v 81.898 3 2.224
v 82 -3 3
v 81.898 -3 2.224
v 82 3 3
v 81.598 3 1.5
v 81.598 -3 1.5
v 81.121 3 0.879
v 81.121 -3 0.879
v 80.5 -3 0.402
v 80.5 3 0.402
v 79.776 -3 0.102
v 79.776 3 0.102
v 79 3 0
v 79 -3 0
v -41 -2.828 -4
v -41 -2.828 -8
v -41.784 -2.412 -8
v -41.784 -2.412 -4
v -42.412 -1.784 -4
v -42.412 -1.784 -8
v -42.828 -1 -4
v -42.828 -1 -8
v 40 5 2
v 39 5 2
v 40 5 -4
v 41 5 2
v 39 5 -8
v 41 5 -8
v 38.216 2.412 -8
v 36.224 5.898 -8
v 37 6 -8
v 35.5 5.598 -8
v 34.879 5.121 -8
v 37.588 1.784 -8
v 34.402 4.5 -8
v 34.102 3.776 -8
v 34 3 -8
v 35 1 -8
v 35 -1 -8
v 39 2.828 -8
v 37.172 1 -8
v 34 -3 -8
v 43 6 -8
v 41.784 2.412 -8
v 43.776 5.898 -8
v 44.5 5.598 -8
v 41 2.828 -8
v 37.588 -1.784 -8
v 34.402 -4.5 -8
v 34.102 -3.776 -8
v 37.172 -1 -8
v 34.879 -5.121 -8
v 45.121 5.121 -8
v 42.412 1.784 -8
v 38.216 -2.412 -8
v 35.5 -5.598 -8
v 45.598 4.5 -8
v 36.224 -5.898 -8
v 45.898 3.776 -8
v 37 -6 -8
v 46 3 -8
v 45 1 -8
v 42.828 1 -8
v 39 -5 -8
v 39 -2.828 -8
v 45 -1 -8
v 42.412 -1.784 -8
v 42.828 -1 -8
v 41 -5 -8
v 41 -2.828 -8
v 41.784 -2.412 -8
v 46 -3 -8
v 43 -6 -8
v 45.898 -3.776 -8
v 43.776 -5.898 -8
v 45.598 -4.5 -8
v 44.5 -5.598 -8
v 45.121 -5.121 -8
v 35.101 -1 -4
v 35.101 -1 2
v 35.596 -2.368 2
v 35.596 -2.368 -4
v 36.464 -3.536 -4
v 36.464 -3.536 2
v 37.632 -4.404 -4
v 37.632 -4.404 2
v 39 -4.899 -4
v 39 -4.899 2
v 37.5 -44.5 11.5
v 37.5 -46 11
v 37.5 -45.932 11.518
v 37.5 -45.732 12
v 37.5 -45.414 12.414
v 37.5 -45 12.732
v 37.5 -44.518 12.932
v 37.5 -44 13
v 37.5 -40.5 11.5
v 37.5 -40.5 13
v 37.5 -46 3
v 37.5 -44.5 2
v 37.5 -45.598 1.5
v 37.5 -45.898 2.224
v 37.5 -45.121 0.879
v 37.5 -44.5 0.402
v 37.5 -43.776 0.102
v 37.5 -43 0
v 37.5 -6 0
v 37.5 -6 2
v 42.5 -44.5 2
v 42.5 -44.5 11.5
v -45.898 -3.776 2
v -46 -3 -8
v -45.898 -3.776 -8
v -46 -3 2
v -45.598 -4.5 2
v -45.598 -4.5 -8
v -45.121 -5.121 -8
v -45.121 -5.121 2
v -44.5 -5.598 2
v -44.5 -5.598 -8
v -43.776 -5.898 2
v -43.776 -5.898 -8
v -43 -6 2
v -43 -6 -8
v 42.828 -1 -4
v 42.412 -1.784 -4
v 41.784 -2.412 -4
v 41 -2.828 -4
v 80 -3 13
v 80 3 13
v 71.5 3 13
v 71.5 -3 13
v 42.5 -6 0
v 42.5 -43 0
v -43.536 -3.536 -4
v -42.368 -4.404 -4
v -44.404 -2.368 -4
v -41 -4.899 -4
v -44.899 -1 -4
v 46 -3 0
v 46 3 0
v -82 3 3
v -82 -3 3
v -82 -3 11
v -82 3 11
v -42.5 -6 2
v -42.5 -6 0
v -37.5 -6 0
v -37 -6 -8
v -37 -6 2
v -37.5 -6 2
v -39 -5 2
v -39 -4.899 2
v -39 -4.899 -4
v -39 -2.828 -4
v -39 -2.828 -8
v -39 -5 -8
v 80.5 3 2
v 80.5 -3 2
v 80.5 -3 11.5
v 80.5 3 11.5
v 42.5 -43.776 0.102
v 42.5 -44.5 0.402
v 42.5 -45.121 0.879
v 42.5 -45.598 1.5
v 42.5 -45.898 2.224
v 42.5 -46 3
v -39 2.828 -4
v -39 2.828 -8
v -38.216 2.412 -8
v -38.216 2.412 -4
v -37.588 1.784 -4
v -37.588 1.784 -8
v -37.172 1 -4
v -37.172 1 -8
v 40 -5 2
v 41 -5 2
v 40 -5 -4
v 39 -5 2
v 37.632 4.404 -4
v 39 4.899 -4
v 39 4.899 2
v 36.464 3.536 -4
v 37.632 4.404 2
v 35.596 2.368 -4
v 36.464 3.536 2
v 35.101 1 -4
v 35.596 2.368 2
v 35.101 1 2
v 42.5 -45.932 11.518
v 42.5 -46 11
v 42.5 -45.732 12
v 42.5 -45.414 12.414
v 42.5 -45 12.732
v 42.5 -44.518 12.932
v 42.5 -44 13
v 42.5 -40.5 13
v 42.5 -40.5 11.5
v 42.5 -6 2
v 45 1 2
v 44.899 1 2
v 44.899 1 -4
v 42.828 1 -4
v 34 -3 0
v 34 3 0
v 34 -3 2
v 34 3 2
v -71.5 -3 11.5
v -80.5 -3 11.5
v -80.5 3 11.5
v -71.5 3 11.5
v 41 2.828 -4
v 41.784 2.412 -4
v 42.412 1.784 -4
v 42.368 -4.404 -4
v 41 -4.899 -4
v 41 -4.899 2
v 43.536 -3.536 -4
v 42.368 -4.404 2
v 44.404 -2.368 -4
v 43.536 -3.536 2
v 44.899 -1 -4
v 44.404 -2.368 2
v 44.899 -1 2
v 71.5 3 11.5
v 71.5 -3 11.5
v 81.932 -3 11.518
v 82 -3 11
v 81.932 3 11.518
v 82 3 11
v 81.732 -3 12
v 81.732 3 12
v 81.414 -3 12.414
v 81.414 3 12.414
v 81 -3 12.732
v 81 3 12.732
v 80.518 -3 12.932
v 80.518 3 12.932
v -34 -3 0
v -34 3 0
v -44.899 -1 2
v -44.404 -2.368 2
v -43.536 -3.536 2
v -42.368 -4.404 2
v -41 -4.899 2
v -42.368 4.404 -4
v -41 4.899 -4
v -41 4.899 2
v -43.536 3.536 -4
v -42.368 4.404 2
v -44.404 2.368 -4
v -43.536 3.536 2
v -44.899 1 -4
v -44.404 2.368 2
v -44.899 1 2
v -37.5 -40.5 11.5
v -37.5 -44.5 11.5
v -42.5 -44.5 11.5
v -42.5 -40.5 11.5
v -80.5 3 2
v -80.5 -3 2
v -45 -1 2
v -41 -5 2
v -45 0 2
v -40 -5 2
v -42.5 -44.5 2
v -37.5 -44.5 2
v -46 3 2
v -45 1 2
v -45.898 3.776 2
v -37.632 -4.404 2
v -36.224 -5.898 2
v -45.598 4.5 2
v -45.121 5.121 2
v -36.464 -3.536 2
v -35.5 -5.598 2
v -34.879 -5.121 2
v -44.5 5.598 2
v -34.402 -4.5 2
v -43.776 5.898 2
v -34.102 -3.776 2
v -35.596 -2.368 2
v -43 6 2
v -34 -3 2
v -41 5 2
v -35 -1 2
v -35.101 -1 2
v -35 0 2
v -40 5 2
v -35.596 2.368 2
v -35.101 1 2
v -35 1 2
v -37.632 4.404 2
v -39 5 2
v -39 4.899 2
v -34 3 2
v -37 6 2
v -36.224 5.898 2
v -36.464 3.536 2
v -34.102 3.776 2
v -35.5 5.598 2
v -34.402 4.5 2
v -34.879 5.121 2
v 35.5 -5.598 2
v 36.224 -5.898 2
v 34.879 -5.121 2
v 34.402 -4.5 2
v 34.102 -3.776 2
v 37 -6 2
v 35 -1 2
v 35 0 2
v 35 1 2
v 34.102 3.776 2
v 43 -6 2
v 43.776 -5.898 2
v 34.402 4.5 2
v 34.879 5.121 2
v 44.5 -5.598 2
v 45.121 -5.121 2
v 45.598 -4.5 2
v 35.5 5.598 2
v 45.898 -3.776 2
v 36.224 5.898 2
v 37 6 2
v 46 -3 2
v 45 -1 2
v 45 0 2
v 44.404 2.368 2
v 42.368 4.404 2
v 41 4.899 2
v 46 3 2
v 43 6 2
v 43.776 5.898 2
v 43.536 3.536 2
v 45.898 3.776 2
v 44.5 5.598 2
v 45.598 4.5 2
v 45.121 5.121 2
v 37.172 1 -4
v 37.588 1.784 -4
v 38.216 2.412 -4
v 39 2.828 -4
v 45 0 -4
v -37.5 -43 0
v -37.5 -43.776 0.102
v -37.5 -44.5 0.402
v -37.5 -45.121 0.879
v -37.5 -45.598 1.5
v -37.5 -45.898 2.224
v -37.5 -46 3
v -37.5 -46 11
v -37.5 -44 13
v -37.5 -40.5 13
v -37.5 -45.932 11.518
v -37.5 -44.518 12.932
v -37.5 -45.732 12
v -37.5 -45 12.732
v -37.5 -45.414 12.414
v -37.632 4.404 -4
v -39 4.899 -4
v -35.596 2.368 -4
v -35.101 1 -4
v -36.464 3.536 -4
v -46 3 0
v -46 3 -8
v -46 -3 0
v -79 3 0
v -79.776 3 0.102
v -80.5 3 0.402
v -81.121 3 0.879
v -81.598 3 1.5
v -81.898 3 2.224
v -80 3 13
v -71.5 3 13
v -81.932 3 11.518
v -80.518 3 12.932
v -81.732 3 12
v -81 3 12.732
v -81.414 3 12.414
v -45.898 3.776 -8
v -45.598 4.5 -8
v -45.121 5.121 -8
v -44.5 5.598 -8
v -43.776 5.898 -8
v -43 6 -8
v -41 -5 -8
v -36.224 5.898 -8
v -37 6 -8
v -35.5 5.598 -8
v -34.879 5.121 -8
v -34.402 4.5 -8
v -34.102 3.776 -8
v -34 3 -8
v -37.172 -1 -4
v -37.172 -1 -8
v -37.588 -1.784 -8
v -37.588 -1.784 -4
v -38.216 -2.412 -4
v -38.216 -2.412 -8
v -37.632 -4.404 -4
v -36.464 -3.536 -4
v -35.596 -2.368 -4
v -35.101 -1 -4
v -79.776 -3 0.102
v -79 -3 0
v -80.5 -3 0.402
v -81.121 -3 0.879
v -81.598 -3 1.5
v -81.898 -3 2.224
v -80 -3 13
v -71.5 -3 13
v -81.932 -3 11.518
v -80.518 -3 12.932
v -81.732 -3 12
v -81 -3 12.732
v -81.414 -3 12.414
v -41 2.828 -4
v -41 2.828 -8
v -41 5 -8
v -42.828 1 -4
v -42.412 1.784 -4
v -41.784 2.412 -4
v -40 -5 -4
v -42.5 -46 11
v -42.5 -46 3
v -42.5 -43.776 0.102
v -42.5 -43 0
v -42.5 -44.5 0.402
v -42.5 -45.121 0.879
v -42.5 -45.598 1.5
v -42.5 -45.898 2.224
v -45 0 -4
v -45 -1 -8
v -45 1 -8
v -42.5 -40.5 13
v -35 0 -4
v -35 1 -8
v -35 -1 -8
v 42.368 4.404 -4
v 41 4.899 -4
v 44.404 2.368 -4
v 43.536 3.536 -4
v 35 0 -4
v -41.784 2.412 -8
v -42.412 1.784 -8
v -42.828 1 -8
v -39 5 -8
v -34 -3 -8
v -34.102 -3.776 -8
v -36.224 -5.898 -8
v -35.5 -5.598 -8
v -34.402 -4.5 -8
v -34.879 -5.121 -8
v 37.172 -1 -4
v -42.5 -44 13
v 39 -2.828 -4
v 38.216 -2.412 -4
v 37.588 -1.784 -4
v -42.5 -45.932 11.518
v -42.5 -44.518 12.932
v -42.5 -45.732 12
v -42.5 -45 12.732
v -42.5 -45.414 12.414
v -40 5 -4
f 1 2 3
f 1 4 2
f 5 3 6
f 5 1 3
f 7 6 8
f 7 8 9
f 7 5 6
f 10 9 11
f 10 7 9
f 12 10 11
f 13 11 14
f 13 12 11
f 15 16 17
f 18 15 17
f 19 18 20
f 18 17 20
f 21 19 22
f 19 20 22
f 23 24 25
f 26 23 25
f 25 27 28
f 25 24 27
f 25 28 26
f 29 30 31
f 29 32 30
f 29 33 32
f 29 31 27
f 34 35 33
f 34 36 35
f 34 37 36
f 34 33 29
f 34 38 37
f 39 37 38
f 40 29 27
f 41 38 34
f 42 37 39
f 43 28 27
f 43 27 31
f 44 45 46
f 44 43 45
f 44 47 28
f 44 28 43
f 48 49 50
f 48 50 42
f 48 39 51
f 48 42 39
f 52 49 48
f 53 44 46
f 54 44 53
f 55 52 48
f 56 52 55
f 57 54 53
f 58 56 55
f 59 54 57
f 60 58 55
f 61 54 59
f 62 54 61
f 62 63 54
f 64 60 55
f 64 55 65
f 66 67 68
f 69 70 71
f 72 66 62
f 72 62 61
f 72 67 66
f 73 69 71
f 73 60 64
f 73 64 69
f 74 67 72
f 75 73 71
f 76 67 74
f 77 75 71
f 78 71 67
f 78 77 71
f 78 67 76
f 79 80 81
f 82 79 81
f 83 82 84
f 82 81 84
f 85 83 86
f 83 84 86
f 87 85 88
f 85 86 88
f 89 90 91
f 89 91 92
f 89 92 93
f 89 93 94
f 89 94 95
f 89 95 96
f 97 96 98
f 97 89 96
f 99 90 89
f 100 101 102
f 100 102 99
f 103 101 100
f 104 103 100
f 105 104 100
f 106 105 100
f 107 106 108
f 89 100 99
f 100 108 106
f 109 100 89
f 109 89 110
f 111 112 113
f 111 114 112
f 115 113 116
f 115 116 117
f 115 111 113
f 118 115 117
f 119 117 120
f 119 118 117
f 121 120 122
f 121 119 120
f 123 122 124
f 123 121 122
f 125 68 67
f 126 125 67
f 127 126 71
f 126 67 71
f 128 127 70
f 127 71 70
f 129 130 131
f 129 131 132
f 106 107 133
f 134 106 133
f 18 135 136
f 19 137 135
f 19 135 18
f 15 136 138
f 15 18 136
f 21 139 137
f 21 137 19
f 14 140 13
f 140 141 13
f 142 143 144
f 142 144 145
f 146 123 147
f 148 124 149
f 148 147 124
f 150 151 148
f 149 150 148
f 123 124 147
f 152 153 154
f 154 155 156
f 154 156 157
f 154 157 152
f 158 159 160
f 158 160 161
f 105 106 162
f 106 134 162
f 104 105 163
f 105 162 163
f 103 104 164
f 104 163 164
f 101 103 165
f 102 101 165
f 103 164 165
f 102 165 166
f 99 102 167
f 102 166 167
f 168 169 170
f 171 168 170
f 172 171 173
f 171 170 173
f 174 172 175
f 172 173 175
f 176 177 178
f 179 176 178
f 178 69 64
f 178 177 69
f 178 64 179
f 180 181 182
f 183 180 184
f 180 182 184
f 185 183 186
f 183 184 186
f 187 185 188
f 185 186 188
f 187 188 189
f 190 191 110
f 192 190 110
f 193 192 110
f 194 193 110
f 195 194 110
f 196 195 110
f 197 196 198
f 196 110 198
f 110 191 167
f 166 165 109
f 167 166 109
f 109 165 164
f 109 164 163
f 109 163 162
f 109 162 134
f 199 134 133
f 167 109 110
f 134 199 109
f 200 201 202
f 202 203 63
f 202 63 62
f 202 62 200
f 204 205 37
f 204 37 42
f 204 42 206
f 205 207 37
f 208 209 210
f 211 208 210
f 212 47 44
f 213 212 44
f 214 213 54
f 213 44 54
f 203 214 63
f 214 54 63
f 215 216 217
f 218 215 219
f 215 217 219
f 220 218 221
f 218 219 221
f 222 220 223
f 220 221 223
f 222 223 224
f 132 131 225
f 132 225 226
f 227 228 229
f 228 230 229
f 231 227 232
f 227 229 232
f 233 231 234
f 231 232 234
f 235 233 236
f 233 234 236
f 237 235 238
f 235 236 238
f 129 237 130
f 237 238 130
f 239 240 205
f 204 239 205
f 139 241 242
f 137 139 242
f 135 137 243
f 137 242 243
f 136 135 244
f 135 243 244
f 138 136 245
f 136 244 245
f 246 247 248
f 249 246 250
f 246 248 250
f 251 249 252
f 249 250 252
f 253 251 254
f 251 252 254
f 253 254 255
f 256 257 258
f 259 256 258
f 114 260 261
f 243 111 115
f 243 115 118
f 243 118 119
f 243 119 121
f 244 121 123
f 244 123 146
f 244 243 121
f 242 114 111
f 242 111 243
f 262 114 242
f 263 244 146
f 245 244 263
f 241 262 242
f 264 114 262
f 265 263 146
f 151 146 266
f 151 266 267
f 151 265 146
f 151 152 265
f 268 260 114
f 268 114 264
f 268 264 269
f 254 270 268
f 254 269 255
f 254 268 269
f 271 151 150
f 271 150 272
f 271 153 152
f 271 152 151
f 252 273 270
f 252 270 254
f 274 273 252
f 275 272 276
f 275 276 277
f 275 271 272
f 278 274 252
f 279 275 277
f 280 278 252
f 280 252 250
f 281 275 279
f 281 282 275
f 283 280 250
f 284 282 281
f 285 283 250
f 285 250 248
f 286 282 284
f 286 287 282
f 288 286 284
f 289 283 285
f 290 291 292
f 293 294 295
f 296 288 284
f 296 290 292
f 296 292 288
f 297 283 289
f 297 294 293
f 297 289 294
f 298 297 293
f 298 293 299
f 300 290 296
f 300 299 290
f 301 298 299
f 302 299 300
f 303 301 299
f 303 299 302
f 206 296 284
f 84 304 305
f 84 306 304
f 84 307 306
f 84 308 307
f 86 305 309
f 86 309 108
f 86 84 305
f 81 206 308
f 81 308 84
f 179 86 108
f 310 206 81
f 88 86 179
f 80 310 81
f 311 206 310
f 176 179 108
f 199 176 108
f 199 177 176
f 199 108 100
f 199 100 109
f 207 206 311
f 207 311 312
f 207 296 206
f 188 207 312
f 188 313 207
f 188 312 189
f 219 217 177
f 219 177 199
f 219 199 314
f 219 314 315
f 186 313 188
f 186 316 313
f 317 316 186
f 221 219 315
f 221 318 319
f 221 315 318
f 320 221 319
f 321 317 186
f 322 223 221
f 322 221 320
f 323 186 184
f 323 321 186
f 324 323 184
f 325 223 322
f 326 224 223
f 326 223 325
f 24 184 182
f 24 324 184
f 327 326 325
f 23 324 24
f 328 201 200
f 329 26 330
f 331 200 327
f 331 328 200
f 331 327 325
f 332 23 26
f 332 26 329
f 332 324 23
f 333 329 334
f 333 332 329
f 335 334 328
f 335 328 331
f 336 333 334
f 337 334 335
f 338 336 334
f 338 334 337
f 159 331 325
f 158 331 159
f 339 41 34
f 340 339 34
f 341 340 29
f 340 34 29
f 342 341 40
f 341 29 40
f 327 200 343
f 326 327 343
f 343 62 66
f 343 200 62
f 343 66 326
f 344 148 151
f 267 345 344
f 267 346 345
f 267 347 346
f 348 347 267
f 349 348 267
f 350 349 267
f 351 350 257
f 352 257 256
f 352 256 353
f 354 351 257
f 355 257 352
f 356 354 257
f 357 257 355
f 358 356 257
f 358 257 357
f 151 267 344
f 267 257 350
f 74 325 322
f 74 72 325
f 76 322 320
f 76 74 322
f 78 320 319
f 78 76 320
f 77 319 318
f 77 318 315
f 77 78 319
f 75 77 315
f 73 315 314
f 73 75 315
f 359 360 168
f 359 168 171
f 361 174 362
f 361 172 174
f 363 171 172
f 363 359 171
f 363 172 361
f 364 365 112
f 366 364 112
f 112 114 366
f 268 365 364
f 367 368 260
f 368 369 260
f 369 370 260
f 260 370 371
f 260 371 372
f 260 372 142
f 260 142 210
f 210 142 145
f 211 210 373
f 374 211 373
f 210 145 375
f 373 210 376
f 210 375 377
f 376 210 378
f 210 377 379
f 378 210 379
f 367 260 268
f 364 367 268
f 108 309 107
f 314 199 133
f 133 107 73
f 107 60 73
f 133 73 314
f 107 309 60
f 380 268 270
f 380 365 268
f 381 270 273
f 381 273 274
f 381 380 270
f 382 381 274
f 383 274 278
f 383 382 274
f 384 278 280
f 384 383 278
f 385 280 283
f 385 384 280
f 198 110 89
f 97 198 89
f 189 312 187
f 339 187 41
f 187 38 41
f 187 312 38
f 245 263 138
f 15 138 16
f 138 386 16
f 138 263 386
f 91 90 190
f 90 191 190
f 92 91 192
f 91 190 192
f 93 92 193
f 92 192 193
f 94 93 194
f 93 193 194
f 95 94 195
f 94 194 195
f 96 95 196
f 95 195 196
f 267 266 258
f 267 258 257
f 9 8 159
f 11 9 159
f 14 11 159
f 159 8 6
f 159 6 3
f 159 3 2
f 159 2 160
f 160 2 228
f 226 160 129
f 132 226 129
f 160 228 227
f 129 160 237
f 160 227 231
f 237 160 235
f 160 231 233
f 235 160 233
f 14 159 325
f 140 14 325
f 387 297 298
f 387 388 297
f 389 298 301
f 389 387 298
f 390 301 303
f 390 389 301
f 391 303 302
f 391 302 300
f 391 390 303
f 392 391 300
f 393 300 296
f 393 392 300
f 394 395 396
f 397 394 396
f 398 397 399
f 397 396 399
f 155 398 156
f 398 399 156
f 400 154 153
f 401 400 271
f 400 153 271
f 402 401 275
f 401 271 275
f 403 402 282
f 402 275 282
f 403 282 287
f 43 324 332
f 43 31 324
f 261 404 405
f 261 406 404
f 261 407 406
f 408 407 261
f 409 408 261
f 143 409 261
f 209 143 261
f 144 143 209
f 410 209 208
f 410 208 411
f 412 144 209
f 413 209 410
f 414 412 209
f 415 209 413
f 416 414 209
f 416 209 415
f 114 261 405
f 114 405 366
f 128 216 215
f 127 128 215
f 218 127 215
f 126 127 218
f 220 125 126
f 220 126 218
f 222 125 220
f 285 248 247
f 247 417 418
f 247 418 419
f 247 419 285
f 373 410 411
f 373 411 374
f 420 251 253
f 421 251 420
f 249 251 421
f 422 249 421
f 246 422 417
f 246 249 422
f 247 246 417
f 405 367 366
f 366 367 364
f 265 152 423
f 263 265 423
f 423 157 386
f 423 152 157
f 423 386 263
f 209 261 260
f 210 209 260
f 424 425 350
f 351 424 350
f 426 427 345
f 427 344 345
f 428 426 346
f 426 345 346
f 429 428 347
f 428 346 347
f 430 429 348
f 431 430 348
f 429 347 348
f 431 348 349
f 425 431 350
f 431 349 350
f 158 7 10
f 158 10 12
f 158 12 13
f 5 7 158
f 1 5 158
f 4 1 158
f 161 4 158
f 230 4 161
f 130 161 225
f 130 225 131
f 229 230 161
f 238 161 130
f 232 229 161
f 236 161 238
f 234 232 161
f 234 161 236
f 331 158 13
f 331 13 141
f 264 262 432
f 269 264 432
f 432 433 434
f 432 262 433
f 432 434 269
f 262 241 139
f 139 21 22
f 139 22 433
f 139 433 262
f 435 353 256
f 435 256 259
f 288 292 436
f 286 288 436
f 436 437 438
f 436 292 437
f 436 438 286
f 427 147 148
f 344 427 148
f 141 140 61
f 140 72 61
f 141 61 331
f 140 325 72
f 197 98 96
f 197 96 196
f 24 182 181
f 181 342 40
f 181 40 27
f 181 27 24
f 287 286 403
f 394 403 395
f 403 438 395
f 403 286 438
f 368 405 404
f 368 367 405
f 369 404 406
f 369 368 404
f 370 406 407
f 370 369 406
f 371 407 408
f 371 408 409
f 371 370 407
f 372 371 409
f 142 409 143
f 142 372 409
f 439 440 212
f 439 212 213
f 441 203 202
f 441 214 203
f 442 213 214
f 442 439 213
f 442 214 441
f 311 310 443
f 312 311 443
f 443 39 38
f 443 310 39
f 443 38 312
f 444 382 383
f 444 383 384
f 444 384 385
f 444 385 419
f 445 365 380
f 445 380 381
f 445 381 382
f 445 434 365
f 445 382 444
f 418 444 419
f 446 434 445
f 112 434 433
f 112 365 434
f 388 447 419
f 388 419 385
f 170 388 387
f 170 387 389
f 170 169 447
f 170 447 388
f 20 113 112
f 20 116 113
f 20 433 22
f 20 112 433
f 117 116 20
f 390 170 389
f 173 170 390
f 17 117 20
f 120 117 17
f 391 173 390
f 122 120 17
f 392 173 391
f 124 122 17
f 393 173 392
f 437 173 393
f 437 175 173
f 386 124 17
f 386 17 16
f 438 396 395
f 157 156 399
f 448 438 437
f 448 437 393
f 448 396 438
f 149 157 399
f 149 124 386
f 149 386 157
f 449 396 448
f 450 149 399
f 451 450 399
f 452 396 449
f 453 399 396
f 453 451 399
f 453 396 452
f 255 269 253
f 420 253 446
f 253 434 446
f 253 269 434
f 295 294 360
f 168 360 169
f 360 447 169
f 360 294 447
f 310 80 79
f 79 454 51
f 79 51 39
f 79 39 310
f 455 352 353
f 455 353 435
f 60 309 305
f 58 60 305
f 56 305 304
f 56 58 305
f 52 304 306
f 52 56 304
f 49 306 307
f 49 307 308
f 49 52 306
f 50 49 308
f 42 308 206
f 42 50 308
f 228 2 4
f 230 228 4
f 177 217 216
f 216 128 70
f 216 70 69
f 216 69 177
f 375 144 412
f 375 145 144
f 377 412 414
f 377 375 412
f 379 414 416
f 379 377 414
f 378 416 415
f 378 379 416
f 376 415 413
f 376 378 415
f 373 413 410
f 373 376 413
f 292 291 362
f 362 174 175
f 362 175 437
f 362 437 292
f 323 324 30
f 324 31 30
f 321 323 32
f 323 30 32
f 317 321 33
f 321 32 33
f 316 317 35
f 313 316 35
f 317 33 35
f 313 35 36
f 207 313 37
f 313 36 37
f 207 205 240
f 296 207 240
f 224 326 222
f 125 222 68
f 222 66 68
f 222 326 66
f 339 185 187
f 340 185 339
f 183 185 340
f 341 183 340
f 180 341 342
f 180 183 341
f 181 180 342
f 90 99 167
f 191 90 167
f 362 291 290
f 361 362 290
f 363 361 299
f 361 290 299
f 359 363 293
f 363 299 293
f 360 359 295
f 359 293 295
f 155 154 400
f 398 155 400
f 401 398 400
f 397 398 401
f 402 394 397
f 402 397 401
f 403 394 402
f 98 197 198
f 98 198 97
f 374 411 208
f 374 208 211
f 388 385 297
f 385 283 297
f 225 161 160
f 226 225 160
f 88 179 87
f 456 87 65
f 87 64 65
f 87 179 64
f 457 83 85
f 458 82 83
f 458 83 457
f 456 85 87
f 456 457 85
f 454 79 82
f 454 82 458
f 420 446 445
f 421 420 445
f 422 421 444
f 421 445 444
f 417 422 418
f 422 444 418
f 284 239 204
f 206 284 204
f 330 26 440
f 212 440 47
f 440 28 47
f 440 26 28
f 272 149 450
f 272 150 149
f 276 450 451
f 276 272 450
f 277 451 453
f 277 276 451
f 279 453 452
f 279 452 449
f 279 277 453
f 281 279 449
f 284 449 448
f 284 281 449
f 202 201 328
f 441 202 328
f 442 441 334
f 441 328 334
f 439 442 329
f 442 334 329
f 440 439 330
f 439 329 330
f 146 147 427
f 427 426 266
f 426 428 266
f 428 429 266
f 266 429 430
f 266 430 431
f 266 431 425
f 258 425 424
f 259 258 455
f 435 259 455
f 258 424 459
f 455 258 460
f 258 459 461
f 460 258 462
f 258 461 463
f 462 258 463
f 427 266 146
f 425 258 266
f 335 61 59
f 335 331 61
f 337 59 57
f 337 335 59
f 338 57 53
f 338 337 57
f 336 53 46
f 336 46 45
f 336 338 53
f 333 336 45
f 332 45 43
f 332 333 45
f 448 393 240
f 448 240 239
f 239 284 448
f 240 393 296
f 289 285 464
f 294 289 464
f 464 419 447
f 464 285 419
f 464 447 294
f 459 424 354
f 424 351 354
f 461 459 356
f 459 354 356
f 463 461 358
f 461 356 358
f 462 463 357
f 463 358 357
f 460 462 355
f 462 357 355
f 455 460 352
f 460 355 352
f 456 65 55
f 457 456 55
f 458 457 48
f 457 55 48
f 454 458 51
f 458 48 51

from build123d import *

# Parameters (mm, degrees)
F0_W      = 36
F0_H      = 6
F0_W_2    = 12
F0_H_2    = 3
F0_W_3    = 34
F0_W_4    = 2.5
F0_H_3    = 40
F1_DEPTH  = 2
F2_W      = 5
F2_H      = 1.5
F2_W_2    = 1.5
F2_H_2    = 6
F3_DEPTH  = 11
F4_W      = 5
F4_H      = 1.5
F5_DEPTH  = 4
F6_W      = 6
F6_H      = 1.5
F7_DEPTH  = 9
F8_W      = 6
F8_H      = 1.5
F9_DEPTH  = 9
F10_W     = 12
F10_H     = 12
F11_DEPTH = 8
F12_R     = 5
F13_DEPTH = 6
F15_DEPTH = 10
F16_R     = 2.99999
F17_R     = 2


# Not quite as in the source:
# - a fillet or chamfer is up to 0.001 mm smaller than in the source, because OpenCascade refuses the exact size


with BuildPart() as f1:
    # F0 (on Top) → F1 (new body)
    with BuildSketch(Plane.XY):
        with Locations((64, 0)):
            Rectangle(F0_W, F0_H)
        Polygon((46, -3), (46, 3), (34, 3), (34, 0), (34, -3), align=None)
        with Locations((40, 4.5)):
            Rectangle(F0_W_2, F0_H_2)
        Polygon((34, 0), (34, 3), (-34, 3), (-34, 0), (0, 0), align=None)
        Polygon((46, -6), (46, -3), (34, -3), (34, -6), (37.5, -6), (40, -6), (42.5, -6), align=None)
        Polygon((-34, 0), (-34, 3), (-46, 3), (-46, -3), (-34, -3), align=None)
        with Locations((-40, 4.5)):
            Rectangle(F0_W_2, F0_H_2)
        with Locations((17, -1.5)):
            Rectangle(F0_W_3, F0_H_2)
        with Locations((-64, 0)):
            Rectangle(F0_W, F0_H)
        with Locations((-17, -1.5)):
            Rectangle(F0_W_3, F0_H_2)
        with Locations((41.25, -26)):
            Rectangle(F0_W_4, F0_H_3)
        Polygon((-34, -3), (-46, -3), (-46, -6), (-42.5, -6), (-40, -6), (-37.5, -6), (-34, -6), align=None)
        with Locations((38.75, -26)):
            Rectangle(F0_W_4, F0_H_3)
        with Locations((-41.25, -26)):
            Rectangle(F0_W_4, F0_H_3)
        with Locations((-38.75, -26)):
            Rectangle(F0_W_4, F0_H_3)
    extrude(amount=F1_DEPTH)

    # F2 (on face) → F3 (join)
    with BuildSketch(Plane.XY.offset(2)):
        with Locations((-40, -45.25)):
            Rectangle(F2_W, F2_H)
        with Locations((40, -45.25)):
            Rectangle(F2_W, F2_H)
        with Locations((-81.25, 0)):
            Rectangle(F2_W_2, F2_H_2)
        with Locations((81.25, 0)):
            Rectangle(F2_W_2, F2_H_2)
    extrude(amount=F3_DEPTH)

    # F4 (on face) → F5 (join)
    with BuildSketch(Plane(origin=(0, -44.5, 0), x_dir=(-1, 0, 0), z_dir=(0, 1, 0))):
        with Locations((40, 12.25)):
            Rectangle(F4_W, F4_H)
        with Locations((-40, 12.25)):
            Rectangle(F4_W, F4_H)
    extrude(amount=F5_DEPTH)

    # F6 (on face) → F7 (join)
    with BuildSketch(Plane(origin=(80.5, 0, 0), x_dir=(0, -1, 0), z_dir=(-1, 0, 0))):
        with Locations((0, 12.25)):
            Rectangle(F6_W, F6_H)
    extrude(amount=F7_DEPTH)

    # F8 (on face) → F9 (join)
    with BuildSketch(Plane.YZ.offset(-80.5)):
        with Locations((0, 12.25)):
            Rectangle(F8_W, F8_H)
    extrude(amount=F9_DEPTH)

    # F10 (on face) → F11 (join)
    with BuildSketch(Plane(origin=(0, 0, 0), x_dir=(1, 0, 0), z_dir=(0, 0, -1))):
        with Locations((-40, 0)):
            Rectangle(F10_W, F10_H)
        with Locations((40, 0)):
            Rectangle(F10_W, F10_H)
    extrude(amount=F11_DEPTH)

    # F12 (on face) → F13 (cut)
    with BuildSketch(Plane.XY.offset(2)):
        with Locations((-40, 0)):
            Circle(F12_R)
        with Locations((40, 0)):
            Circle(F12_R)
    extrude(amount=-F13_DEPTH, mode=Mode.SUBTRACT)

    # F14 (on face) → F15 (cut)
    with BuildSketch(Plane(origin=(0, 0, -8), x_dir=(1, 0, 0), z_dir=(0, 0, -1))):
        with BuildLine():
            ThreePointArc((42.8284271247, -1), (42.956795679, -0.5073059362), (43, 0))
            ThreePointArc((43, 0), (42.956795679, 0.5073059362), (42.8284271247, 1))
            ThreePointArc((42.8284271247, 1), (42.1213203436, 2.1213203436), (41, 2.8284271247))
            ThreePointArc((41, 2.8284271247), (40, 3), (39, 2.8284271247))
            ThreePointArc((39, 2.8284271247), (37.8786796564, 2.1213203436), (37.1715728753, 1))
            ThreePointArc((37.1715728753, 1), (37, 0), (37.1715728753, -1))
            ThreePointArc((37.1715728753, -1), (37.8786796564, -2.1213203436), (39, -2.8284271247))
            ThreePointArc((39, -2.8284271247), (40, -3), (41, -2.8284271247))
            ThreePointArc((41, -2.8284271247), (42.1213203436, -2.1213203436), (42.8284271247, -1))
        make_face()
        with BuildLine():
            ThreePointArc((42.8284271247, 1), (42.956795679, 0.5073059362), (43, 0))
            ThreePointArc((43, 0), (42.956795679, -0.5073059362), (42.8284271247, -1))
            Line((42.8284271247, -1), (45, -1))
            Line((45, -1), (45, 0))
            Line((45, 0), (45, 1))
            Line((45, 1), (42.8284271247, 1))
        make_face()
        with BuildLine():
            ThreePointArc((39, 2.8284271247), (40, 3), (41, 2.8284271247))
            Line((41, 2.8284271247), (41, 5))
            Line((41, 5), (40, 5))
            Line((40, 5), (39, 5))
            Line((39, 5), (39, 2.8284271247))
        make_face()
        with BuildLine():
            Line((41, -5), (41, -2.8284271247))
            ThreePointArc((41, -2.8284271247), (40, -3), (39, -2.8284271247))
            Line((39, -2.8284271247), (39, -5))
            Line((39, -5), (40, -5))
            Line((40, -5), (41, -5))
        make_face()
        with BuildLine():
            ThreePointArc((37.1715728753, -1), (37, 0), (37.1715728753, 1))
            Line((37.1715728753, 1), (35, 1))
            Line((35, 1), (35, 0))
            Line((35, 0), (35, -1))
            Line((35, -1), (37.1715728753, -1))
        make_face()
        with BuildLine():
            ThreePointArc((-37.1715728753, -1), (-37.043204321, -0.5073059362), (-37, 0))
            ThreePointArc((-37, 0), (-37.043204321, 0.5073059362), (-37.1715728753, 1))
            ThreePointArc((-37.1715728753, 1), (-37.8786796564, 2.1213203436), (-39, 2.8284271247))
            ThreePointArc((-39, 2.8284271247), (-40, 3), (-41, 2.8284271247))
            ThreePointArc((-41, 2.8284271247), (-42.1213203436, 2.1213203436), (-42.8284271247, 1))
            ThreePointArc((-42.8284271247, 1), (-43, 0), (-42.8284271247, -1))
            ThreePointArc((-42.8284271247, -1), (-42.1213203436, -2.1213203436), (-41, -2.8284271247))
            ThreePointArc((-41, -2.8284271247), (-40, -3), (-39, -2.8284271247))
            ThreePointArc((-39, -2.8284271247), (-37.8786796564, -2.1213203436), (-37.1715728753, -1))
        make_face()
        with BuildLine():
            ThreePointArc((-37.1715728753, 1), (-37.043204321, 0.5073059362), (-37, 0))
            ThreePointArc((-37, 0), (-37.043204321, -0.5073059362), (-37.1715728753, -1))
            Line((-37.1715728753, -1), (-35, -1))
            Line((-35, -1), (-35, 0))
            Line((-35, 0), (-35, 1))
            Line((-35, 1), (-37.1715728753, 1))
        make_face()
        with BuildLine():
            ThreePointArc((-41, 2.8284271247), (-40, 3), (-39, 2.8284271247))
            Line((-39, 2.8284271247), (-39, 5))
            Line((-39, 5), (-40, 5))
            Line((-40, 5), (-41, 5))
            Line((-41, 5), (-41, 2.8284271247))
        make_face()
        with BuildLine():
            Line((-39, -5), (-39, -2.8284271247))
            ThreePointArc((-39, -2.8284271247), (-40, -3), (-41, -2.8284271247))
            Line((-41, -2.8284271247), (-41, -5))
            Line((-41, -5), (-40, -5))
            Line((-40, -5), (-39, -5))
        make_face()
        with BuildLine():
            ThreePointArc((-42.8284271247, -1), (-43, 0), (-42.8284271247, 1))
            Line((-42.8284271247, 1), (-45, 1))
            Line((-45, 1), (-45, 0))
            Line((-45, 0), (-45, -1))
            Line((-45, -1), (-42.8284271247, -1))
        make_face()
    extrude(amount=-F15_DEPTH, mode=Mode.SUBTRACT)

    # F16 (radius 3 in the source; OpenCascade refuses exactly that, so slightly less here)
    f16_edges = [f1.edges().sort_by_distance(p)[0] for p in [
        (-46, 6, -3),
        (-34, 6, -3),
        (-34, -6, -3),
        (-46, -6, -3),
        (46, 6, -3),
        (34, 6, -3),
        (46, -6, -3),
        (34, -6, -3),
        (40, -46, 0),
        (-40, -46, 0),
        (-82, 0, 0),
        (82, 0, 0),
    ]]
    fillet(f16_edges, radius=F16_R)

    # F17
    f17_edges = [f1.edges().sort_by_distance(p)[0] for p in [
        (-82, 0, 13),
        (-40, -46, 13),
        (40, -46, 13),
        (82, 0, 13),
    ]]
    fillet(f17_edges, radius=F17_R)


solid = f1.part
